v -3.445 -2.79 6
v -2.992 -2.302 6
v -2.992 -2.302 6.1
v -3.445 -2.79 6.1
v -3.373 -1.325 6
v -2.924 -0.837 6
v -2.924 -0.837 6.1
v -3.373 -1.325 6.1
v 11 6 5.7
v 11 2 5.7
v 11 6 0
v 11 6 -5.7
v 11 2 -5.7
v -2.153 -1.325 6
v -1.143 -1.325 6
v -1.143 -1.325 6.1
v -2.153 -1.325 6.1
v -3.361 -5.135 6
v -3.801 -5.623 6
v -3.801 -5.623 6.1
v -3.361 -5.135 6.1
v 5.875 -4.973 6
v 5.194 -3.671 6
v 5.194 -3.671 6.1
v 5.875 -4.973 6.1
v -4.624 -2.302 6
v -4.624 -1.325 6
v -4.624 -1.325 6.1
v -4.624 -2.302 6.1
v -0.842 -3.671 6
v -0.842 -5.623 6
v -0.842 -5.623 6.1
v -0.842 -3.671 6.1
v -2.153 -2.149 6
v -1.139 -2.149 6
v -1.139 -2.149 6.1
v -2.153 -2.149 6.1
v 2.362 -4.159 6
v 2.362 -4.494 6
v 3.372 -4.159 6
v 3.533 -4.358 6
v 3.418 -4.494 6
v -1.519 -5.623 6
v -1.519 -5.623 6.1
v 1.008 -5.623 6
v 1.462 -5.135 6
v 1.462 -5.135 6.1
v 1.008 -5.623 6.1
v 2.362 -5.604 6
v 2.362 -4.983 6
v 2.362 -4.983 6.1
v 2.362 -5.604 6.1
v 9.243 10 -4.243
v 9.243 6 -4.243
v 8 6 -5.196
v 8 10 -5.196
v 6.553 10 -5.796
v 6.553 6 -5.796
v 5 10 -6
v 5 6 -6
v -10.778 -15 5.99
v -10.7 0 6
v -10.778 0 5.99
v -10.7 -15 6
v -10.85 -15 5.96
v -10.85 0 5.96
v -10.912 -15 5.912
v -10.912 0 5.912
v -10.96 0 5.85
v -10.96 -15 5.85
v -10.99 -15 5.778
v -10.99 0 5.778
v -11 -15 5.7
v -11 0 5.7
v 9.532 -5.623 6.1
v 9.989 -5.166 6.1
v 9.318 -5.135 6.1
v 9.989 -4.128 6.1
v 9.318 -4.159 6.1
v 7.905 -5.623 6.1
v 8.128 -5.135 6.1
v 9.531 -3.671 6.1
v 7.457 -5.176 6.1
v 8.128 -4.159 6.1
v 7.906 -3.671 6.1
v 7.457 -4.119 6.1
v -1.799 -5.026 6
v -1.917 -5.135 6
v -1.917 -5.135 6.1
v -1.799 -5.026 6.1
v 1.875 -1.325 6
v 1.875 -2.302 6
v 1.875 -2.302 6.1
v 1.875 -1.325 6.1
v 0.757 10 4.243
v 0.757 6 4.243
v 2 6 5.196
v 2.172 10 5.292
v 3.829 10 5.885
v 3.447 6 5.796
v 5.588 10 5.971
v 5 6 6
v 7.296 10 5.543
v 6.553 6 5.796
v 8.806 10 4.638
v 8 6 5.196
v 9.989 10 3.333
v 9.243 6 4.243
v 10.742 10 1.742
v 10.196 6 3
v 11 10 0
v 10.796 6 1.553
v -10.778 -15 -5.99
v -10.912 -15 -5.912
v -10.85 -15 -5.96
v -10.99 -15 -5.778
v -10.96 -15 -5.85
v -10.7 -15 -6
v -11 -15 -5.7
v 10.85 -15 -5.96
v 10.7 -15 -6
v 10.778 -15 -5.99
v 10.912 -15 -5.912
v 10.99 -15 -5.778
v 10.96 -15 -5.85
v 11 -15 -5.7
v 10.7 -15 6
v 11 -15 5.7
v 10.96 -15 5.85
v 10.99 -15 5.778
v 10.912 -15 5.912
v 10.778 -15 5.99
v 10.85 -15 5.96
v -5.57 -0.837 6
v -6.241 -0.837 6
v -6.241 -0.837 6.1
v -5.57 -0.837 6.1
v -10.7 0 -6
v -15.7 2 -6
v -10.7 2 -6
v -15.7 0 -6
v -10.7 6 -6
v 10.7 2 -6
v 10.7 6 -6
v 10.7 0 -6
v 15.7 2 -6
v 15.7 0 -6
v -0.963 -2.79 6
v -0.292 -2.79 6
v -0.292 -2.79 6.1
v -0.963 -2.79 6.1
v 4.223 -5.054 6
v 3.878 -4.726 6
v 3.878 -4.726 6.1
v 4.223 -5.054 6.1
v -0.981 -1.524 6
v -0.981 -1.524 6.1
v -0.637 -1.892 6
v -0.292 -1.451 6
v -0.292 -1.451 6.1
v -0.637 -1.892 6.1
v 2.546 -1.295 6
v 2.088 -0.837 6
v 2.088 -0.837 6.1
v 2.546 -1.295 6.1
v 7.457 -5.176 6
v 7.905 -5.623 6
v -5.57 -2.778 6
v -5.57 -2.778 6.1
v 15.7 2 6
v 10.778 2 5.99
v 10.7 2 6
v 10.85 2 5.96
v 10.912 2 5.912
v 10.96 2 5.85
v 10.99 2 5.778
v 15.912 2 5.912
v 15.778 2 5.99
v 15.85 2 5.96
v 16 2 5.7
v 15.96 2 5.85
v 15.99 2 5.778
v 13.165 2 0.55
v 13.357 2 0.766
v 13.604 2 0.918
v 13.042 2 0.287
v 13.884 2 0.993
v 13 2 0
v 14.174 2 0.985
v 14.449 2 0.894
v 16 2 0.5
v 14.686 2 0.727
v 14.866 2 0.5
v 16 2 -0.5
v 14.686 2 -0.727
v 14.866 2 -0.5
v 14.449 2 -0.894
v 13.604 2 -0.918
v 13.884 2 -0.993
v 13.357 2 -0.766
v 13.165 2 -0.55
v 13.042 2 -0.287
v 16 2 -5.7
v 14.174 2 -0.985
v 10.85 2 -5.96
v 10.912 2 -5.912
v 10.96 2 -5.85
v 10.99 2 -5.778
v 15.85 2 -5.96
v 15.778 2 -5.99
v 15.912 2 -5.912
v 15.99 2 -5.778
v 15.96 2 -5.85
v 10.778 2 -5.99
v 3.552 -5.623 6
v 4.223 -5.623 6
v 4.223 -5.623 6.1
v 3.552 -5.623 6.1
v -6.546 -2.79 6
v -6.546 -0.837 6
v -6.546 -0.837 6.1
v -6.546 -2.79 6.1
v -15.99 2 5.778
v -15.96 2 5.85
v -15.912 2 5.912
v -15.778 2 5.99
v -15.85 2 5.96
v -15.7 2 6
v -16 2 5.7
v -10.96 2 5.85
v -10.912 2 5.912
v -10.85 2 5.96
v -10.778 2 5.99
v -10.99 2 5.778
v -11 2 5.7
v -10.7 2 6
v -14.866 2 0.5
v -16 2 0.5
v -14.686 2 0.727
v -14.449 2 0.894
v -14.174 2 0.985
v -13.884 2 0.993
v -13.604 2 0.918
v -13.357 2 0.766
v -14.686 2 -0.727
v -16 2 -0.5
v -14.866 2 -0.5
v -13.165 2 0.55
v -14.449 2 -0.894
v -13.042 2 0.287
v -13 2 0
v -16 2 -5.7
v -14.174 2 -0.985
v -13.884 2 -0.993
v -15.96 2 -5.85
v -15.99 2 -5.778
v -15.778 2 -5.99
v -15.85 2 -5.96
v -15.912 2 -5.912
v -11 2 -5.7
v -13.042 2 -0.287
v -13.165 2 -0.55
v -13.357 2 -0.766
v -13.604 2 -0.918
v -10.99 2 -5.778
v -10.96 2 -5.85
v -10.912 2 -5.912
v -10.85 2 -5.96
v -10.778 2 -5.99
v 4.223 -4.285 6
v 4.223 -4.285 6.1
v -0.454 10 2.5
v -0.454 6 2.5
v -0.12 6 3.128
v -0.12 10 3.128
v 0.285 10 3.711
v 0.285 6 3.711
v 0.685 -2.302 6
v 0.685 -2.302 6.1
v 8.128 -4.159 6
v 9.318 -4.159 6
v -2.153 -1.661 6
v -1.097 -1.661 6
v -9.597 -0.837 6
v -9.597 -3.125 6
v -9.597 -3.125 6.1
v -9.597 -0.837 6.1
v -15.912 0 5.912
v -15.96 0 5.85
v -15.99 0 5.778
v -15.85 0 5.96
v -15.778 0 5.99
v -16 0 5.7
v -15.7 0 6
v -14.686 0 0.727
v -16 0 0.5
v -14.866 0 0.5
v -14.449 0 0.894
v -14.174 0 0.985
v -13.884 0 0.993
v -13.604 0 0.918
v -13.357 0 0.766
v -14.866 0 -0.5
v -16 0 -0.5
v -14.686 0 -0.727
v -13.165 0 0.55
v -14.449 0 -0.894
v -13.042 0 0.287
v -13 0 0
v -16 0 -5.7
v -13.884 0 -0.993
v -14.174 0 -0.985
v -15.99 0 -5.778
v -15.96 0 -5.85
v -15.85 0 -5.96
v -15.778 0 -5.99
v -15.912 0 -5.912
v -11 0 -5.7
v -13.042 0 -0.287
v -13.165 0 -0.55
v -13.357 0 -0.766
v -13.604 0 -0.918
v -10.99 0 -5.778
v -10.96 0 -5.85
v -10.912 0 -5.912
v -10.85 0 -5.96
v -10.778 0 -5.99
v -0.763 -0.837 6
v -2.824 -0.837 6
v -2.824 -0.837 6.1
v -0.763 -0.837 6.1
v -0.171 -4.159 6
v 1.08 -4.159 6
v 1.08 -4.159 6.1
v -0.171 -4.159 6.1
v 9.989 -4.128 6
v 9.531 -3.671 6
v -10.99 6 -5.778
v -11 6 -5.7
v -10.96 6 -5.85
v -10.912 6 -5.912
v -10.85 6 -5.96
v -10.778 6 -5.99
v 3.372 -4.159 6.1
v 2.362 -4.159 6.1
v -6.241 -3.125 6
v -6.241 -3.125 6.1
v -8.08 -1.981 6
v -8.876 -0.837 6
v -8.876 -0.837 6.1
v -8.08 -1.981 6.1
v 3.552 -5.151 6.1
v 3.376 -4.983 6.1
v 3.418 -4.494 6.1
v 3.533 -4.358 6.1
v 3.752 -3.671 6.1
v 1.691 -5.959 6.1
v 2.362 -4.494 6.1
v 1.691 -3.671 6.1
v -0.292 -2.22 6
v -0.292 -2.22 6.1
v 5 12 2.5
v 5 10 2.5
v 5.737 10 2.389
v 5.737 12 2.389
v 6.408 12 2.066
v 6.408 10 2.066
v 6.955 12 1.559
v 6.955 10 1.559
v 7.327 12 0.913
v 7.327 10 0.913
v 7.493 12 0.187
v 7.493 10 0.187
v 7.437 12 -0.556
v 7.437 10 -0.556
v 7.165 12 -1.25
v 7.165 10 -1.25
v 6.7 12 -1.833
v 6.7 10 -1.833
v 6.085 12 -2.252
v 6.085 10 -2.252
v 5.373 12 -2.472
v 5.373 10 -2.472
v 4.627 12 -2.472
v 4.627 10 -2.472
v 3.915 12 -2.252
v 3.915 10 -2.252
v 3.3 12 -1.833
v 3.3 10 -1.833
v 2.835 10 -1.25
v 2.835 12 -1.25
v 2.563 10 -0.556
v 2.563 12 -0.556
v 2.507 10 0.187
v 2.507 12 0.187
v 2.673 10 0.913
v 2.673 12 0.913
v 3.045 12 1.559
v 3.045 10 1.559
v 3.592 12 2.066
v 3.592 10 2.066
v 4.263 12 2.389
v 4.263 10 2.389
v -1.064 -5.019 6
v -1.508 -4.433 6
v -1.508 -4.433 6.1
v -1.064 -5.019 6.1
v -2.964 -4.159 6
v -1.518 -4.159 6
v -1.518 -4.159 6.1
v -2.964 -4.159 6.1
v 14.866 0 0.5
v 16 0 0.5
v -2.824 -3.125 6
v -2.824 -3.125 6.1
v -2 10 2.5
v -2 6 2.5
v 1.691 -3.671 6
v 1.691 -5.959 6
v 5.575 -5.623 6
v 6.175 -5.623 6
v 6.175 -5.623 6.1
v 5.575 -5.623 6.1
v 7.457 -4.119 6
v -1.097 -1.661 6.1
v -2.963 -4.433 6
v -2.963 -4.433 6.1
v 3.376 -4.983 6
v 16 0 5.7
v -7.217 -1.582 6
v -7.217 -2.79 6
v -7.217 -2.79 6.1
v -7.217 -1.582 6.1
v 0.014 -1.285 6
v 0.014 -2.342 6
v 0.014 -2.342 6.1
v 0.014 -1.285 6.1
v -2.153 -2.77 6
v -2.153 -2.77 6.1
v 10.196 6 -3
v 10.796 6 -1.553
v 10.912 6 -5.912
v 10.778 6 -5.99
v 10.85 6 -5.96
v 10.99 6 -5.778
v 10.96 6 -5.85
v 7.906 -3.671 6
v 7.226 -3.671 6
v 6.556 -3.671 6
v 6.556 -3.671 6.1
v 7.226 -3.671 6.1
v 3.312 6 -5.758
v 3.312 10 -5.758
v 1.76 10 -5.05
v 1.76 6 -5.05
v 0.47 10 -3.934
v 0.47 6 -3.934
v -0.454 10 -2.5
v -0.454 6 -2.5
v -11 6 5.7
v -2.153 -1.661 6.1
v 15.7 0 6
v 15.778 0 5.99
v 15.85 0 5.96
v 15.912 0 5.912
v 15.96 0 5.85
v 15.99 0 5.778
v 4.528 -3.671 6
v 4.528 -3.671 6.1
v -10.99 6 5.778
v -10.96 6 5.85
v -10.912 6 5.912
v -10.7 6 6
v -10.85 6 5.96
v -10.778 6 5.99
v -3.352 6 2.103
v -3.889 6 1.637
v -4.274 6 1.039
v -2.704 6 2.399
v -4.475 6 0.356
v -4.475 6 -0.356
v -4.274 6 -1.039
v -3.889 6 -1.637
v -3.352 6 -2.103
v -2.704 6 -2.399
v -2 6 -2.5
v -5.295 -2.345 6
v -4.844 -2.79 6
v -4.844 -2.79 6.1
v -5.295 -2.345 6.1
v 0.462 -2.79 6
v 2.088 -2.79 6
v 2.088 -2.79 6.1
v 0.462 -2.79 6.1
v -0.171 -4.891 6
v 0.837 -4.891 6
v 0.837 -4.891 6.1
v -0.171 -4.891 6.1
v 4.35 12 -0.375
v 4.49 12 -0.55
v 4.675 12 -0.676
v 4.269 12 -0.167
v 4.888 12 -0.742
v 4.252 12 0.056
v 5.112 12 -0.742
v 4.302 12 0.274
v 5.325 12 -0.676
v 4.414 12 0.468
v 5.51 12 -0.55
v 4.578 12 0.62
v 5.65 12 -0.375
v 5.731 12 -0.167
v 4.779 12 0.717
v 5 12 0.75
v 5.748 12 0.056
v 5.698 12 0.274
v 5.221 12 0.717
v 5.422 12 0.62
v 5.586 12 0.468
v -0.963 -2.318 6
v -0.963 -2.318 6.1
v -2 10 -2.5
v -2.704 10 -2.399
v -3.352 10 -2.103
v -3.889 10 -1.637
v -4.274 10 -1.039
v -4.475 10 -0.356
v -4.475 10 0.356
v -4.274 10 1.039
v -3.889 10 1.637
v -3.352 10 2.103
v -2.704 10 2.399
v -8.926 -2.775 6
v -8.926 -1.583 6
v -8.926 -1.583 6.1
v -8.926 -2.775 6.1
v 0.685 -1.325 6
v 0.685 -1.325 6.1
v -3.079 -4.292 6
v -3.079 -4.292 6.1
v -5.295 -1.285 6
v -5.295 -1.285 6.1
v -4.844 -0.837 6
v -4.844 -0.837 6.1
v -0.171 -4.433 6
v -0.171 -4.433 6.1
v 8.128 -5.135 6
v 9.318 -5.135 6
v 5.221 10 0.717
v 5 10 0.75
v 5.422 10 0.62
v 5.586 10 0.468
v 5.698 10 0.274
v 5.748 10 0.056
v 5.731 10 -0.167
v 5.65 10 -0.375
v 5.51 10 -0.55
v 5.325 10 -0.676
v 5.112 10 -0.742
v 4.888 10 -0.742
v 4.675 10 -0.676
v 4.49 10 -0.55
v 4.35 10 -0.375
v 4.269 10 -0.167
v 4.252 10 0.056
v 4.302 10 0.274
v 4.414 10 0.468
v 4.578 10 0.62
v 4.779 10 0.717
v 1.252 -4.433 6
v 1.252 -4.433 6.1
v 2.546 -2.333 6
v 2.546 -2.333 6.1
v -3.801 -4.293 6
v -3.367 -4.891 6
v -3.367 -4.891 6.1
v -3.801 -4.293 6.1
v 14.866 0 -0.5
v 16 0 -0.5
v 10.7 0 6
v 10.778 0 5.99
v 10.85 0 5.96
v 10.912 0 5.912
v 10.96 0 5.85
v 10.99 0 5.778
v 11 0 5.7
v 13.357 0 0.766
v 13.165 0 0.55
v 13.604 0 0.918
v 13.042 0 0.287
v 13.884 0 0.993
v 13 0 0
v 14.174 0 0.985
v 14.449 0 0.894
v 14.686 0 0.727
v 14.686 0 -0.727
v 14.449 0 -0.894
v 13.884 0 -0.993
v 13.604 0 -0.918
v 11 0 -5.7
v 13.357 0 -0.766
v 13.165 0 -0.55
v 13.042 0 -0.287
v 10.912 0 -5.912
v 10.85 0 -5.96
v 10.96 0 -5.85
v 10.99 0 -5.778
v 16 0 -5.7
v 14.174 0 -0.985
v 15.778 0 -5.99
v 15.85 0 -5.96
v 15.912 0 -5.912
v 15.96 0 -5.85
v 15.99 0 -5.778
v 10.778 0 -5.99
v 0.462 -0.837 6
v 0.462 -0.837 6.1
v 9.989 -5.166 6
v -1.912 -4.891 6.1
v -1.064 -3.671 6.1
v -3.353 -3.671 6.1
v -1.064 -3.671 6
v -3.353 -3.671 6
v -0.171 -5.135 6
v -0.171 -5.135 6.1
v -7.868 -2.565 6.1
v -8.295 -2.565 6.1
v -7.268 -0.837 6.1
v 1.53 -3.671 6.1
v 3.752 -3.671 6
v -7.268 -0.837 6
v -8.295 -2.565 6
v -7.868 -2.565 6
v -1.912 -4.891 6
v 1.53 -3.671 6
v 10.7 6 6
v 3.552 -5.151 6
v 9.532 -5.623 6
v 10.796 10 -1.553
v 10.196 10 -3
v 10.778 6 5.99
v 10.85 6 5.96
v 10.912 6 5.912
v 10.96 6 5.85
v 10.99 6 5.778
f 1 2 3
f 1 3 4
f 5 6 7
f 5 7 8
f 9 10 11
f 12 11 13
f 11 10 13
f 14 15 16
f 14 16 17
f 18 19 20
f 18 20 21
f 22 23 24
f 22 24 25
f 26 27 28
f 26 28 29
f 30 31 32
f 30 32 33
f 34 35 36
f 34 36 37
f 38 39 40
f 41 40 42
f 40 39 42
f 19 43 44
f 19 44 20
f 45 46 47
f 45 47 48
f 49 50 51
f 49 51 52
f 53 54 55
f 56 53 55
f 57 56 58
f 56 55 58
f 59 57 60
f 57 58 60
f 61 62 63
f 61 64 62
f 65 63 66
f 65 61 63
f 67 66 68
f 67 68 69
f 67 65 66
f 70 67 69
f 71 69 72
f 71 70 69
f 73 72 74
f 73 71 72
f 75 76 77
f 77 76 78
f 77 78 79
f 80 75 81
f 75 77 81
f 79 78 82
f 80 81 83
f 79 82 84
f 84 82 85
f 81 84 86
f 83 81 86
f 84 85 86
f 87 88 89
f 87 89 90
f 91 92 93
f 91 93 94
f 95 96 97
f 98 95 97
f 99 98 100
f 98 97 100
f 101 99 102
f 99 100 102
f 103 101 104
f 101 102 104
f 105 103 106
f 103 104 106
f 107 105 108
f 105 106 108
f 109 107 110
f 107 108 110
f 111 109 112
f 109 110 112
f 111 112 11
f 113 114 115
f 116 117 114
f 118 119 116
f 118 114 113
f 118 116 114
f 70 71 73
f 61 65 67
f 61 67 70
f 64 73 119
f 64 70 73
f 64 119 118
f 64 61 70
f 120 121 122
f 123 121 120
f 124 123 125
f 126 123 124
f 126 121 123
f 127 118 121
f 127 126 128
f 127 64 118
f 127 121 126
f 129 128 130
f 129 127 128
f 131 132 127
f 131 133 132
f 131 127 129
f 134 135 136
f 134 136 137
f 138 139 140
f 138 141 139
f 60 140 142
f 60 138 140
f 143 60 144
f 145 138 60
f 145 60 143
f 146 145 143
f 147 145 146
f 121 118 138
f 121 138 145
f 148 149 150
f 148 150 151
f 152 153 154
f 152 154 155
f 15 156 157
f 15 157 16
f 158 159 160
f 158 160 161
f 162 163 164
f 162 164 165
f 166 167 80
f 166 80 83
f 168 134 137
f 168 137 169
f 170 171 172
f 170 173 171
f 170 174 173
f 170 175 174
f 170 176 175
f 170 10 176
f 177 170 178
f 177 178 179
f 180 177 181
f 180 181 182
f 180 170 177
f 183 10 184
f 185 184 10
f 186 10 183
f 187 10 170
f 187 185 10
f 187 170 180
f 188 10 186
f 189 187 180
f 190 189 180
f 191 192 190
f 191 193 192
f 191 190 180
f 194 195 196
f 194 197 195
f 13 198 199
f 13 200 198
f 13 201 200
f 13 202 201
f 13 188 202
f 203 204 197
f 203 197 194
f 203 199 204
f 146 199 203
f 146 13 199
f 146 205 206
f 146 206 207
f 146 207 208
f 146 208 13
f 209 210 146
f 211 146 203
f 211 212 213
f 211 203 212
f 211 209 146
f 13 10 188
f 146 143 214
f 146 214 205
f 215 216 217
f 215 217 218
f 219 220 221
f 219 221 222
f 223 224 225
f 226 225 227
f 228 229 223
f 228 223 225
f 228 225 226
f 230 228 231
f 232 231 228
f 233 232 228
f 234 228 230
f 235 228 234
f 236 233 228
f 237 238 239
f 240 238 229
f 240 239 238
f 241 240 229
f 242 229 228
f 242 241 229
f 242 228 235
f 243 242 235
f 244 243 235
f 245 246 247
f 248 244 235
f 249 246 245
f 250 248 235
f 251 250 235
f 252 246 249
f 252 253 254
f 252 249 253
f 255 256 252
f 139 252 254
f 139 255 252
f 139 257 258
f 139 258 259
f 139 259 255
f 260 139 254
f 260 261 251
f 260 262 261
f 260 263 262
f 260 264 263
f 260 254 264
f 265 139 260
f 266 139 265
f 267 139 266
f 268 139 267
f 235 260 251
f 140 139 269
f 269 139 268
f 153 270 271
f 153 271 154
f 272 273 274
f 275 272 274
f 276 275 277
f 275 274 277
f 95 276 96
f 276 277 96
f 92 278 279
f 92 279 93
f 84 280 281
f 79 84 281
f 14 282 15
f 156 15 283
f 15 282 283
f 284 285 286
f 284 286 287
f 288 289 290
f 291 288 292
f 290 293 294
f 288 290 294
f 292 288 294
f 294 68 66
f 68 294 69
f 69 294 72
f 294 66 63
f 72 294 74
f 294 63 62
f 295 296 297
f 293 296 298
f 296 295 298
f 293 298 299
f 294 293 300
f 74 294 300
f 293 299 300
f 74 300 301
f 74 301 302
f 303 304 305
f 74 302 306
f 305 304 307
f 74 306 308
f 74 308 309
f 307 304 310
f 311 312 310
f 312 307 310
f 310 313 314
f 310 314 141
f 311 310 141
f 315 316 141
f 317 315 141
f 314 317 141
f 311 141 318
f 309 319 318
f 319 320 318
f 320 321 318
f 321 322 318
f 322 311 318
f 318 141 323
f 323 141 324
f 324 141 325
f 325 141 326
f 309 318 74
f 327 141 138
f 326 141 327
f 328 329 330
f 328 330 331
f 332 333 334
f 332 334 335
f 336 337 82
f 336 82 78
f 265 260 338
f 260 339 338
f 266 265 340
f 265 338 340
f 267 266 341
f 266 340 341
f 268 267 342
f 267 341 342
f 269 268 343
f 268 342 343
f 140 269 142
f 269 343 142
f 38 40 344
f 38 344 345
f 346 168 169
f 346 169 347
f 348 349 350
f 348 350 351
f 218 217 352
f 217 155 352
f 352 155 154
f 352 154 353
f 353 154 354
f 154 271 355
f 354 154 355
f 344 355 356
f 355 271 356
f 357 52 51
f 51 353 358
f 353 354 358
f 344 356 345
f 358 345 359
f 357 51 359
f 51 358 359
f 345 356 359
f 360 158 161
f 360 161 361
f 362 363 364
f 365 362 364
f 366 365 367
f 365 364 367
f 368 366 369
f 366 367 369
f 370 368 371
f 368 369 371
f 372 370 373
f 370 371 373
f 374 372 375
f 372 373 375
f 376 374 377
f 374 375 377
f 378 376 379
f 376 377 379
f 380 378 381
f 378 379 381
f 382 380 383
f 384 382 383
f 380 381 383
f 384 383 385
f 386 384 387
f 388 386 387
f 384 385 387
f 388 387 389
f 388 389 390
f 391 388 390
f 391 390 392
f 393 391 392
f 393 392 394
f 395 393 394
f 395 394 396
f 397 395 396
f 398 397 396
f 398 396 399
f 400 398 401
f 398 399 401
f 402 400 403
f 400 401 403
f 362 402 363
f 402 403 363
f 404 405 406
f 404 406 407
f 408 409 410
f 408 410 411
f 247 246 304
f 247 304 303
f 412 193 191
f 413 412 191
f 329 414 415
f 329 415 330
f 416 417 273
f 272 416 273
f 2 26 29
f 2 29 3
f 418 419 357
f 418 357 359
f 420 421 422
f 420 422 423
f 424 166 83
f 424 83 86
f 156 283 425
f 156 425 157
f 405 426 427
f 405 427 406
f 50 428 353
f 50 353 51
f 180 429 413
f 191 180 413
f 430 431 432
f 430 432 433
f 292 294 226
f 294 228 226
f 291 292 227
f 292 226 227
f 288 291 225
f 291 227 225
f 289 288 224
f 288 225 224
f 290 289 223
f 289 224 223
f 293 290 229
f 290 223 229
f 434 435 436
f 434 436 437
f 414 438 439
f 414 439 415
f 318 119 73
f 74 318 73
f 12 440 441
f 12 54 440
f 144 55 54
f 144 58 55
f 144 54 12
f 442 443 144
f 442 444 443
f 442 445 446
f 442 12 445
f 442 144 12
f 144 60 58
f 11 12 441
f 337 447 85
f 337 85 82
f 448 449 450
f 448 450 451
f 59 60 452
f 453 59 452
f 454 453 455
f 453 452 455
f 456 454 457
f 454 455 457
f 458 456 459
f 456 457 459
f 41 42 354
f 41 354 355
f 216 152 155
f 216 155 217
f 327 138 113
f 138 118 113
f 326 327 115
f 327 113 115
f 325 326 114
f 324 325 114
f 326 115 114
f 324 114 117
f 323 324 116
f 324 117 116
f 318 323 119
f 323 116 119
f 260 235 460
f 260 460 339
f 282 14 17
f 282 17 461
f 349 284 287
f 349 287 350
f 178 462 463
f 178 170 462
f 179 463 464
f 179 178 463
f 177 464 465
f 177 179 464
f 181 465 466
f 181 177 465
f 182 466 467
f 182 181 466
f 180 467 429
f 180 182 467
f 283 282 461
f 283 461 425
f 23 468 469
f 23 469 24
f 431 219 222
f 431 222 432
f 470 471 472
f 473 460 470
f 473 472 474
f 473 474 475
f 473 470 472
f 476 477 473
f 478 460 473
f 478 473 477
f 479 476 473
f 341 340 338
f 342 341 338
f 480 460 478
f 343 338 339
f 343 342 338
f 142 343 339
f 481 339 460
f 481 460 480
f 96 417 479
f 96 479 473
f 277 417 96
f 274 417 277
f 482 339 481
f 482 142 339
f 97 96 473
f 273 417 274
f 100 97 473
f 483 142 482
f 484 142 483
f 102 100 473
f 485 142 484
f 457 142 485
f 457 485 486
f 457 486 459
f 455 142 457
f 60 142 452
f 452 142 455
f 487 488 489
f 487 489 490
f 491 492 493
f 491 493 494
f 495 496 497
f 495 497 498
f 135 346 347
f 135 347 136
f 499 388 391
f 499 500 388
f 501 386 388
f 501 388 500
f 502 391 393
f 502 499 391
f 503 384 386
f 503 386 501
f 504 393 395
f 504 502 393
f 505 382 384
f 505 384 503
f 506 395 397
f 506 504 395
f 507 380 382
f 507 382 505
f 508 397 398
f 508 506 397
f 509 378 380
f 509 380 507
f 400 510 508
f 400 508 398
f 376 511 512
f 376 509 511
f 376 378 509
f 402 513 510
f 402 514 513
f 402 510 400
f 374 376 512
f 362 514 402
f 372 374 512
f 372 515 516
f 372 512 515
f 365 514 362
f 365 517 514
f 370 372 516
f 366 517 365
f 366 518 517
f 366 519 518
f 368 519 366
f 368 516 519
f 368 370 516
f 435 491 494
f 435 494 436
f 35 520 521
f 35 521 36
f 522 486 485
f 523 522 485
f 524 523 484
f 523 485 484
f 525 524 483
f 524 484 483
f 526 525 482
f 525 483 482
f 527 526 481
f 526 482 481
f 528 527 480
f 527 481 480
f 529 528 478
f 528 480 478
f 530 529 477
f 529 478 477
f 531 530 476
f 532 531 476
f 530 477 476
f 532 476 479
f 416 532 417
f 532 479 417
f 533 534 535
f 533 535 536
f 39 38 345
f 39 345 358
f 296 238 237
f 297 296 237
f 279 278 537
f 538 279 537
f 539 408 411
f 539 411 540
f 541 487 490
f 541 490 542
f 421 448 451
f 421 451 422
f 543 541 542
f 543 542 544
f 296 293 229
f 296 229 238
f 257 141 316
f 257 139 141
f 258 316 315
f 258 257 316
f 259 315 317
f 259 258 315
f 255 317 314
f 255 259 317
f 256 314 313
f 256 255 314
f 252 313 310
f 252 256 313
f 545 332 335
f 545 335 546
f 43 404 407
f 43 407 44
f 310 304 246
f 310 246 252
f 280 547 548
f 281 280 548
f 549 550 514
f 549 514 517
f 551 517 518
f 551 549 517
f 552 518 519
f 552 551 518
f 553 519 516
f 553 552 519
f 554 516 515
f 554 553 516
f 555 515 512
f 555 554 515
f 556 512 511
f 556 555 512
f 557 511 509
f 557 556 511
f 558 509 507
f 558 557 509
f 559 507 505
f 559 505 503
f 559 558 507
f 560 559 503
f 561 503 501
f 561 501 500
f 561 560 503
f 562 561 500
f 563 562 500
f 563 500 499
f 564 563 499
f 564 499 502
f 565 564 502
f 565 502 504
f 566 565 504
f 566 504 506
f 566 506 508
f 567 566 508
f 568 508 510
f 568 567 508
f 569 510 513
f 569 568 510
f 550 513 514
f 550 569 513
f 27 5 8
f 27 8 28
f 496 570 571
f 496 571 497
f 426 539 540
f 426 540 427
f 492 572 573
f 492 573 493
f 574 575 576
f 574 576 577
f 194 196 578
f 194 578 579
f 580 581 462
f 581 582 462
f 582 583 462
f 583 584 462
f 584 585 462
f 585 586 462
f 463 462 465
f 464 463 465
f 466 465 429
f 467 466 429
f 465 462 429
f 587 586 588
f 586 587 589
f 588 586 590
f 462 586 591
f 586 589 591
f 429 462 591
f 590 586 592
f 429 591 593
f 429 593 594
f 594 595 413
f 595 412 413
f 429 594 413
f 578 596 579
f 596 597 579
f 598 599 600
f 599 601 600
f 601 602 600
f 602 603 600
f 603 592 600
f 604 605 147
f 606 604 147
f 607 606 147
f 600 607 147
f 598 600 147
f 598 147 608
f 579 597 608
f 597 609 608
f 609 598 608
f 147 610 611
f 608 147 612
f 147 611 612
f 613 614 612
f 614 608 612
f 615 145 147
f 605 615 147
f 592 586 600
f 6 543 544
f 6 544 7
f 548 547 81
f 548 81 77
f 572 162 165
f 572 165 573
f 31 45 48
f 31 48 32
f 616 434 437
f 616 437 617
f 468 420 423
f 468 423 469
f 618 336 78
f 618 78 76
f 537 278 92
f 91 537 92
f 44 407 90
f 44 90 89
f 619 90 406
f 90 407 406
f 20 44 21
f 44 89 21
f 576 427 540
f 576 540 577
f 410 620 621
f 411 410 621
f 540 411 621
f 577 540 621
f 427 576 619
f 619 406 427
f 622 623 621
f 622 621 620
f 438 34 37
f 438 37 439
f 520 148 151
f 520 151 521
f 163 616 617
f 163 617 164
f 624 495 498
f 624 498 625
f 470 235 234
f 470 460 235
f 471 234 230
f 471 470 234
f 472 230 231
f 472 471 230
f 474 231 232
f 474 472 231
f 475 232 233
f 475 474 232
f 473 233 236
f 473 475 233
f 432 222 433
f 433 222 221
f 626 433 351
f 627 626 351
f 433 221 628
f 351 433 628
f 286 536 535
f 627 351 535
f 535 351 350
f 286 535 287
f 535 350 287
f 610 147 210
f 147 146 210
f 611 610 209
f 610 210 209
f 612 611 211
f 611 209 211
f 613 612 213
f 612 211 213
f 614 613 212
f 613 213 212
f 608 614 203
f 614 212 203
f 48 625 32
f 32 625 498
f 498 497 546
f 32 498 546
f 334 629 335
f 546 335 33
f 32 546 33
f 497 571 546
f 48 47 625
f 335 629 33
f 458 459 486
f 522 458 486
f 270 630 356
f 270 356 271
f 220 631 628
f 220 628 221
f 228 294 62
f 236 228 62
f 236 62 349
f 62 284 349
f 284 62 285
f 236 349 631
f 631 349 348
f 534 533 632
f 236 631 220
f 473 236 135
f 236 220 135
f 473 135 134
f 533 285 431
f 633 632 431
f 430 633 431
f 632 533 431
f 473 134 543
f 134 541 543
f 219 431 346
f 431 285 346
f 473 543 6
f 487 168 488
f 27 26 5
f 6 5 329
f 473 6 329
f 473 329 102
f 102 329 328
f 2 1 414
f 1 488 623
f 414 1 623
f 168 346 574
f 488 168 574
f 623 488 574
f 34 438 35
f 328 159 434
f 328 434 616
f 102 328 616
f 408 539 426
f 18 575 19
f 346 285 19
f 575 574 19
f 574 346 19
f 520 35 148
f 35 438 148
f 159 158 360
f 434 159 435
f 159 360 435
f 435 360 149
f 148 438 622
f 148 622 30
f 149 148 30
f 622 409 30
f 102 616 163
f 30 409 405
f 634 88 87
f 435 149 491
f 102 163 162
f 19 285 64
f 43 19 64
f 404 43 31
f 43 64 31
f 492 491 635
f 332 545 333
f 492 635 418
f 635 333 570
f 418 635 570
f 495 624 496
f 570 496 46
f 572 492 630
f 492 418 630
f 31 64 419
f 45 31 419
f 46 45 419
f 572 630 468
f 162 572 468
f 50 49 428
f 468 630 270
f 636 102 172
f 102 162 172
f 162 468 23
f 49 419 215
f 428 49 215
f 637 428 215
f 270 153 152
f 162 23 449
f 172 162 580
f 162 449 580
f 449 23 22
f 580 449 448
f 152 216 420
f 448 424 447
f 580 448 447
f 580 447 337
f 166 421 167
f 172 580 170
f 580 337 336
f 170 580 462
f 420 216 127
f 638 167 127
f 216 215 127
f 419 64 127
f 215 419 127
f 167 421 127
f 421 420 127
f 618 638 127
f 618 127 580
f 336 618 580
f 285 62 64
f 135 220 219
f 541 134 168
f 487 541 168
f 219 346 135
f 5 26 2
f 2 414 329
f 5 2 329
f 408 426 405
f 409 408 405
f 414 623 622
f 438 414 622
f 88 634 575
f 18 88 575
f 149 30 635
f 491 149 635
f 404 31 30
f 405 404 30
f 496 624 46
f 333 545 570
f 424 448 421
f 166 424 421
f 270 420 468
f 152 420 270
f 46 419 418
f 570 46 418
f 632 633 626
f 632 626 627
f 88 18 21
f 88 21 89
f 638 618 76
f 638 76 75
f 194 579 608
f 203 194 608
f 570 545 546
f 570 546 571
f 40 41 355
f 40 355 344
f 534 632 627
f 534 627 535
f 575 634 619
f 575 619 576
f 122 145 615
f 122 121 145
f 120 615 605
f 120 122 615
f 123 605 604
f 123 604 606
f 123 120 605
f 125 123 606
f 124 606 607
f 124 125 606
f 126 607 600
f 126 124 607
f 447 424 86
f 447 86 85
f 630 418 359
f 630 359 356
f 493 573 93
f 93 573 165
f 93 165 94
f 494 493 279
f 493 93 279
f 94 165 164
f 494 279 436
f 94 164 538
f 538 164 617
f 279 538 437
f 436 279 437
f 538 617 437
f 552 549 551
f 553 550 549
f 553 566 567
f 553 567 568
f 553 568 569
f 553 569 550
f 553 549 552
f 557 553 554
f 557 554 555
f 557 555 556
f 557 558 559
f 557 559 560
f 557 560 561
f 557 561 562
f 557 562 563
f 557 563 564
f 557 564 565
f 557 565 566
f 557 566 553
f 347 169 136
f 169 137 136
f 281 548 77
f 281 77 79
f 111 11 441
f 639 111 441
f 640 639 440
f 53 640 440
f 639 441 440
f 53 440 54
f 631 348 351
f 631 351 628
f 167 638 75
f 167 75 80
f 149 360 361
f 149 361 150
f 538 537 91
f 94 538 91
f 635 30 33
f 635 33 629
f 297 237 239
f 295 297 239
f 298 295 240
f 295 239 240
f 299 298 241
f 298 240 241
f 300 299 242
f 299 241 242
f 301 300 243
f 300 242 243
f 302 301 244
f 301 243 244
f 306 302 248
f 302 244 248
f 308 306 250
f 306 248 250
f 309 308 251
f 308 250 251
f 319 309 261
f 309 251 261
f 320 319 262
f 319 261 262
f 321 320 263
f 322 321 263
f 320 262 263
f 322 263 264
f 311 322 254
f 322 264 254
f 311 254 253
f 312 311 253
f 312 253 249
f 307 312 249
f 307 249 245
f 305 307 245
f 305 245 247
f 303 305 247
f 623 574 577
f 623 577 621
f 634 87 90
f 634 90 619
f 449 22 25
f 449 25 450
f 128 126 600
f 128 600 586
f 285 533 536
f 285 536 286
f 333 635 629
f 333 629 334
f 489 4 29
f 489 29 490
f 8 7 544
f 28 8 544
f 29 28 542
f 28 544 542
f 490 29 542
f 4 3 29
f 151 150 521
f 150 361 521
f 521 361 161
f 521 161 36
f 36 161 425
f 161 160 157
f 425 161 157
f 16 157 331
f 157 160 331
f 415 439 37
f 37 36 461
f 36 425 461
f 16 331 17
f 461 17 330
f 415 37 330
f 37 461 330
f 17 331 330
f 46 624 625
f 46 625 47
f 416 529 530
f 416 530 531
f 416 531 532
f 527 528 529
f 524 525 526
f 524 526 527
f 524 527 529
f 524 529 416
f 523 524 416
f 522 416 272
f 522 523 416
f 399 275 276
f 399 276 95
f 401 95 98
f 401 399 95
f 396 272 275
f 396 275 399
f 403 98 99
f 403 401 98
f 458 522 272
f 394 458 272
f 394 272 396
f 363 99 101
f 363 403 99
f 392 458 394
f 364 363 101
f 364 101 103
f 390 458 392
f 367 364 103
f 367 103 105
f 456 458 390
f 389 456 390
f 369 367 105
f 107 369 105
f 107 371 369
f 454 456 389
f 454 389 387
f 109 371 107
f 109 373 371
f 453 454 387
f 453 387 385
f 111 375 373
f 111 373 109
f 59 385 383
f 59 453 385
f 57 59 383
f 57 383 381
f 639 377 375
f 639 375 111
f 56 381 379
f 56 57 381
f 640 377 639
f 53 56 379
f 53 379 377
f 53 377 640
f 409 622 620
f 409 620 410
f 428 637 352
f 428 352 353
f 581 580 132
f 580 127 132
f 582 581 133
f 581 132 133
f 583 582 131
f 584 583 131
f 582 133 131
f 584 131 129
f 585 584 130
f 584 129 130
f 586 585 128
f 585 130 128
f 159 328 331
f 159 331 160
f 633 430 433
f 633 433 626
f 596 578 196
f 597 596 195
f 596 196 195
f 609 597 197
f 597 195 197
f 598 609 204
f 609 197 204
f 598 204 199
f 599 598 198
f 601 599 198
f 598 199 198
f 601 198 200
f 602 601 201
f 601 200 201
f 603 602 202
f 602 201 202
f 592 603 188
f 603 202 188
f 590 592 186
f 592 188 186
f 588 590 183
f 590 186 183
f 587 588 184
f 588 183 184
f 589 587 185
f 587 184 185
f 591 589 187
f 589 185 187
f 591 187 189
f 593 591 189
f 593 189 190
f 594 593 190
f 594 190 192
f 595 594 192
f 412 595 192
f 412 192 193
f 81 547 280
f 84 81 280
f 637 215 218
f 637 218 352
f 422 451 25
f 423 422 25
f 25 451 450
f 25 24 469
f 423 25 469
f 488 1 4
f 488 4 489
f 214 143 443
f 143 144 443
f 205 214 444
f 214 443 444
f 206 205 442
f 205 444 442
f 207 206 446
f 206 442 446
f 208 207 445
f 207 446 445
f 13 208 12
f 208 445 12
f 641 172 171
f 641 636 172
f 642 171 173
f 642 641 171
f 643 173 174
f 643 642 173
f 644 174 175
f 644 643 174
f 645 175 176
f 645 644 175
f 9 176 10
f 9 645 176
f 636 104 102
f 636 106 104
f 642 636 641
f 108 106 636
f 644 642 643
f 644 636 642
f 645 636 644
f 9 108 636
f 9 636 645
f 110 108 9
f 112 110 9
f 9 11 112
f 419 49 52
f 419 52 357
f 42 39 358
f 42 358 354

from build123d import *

# Parameters (mm, degrees)
SKETCH1_W           = 32
SKETCH1_H           = 12
BOSS_EXTRUDE1_DEPTH = 2
SKETCH2_W           = 22
SKETCH2_H           = 12
BOSS_EXTRUDE2_DEPTH = 15
SKETCH3_W           = 22
SKETCH3_H           = 12
BOSS_EXTRUDE3_DEPTH = 4
BOSS_EXTRUDE4_DEPTH = 4
BOSS_EXTRUDE5_DEPTH = 4
SKETCH6_R           = 2.5
SKETCH6_R_2         = 0.75
BOSS_EXTRUDE6_DEPTH = 2
SKETCH7_R           = 1
SKETCH7_W           = 5
SKETCH7_H           = 1
CUT_EXTRUDE1_DEPTH  = 25.103941586
FILLET1_R           = 0.3
SKETCH8_W           = 1.18990991
SKETCH8_H           = 0.976336336
SKETCH8_H_2         = 0.976336337
BOSS_EXTRUDE7_DEPTH = 0.1


with BuildPart() as part:
    # Sketch1 → Boss-Extrude1 (new body)
    with BuildSketch(Plane(origin=(0, 0, 0), x_dir=(1, 0, 0), z_dir=(0, 1, 0))):
        Rectangle(SKETCH1_W, SKETCH1_H)
    extrude(amount=BOSS_EXTRUDE1_DEPTH)

    # Sketch2 → Boss-Extrude2 (add)
    with BuildSketch(Plane.XZ):
        Rectangle(SKETCH2_W, SKETCH2_H)
    extrude(amount=BOSS_EXTRUDE2_DEPTH)

    # Sketch3 → Boss-Extrude3 (add)
    with BuildSketch(Plane(origin=(0, 2, 0), x_dir=(1, 0, 0), z_dir=(0, 1, 0))):
        Rectangle(SKETCH3_W, SKETCH3_H)
    extrude(amount=BOSS_EXTRUDE3_DEPTH)

    # Sketch4 → Boss-Extrude4 (add)
    with BuildSketch(Plane(origin=(0, 6, 0), x_dir=(1, 0, 0), z_dir=(0, 1, 0))):
        with BuildLine():
            ThreePointArc((9.242640687, 4.242640687), (7.296100594, 5.543277195), (5, 6))
            ThreePointArc((5, 6), (0.757359313, 4.242640687), (-1, 0))
            ThreePointArc((-1, 0), (-0.543277195, -2.296100594), (0.757359313, -4.242640687))
            Line((0.757359313, -4.242640687), (9.242640687, 4.242640687))
        make_face()
        with BuildLine():
            ThreePointArc((11, 0), (10.543277195, 2.296100594), (9.242640687, 4.242640687))
            Line((9.242640687, 4.242640687), (0.757359313, -4.242640687))
            ThreePointArc((0.757359313, -4.242640687), (7.296100594, -5.543277195), (11, 0))
        make_face()
    extrude(amount=BOSS_EXTRUDE4_DEPTH)

    # Sketch5 → Boss-Extrude5 (add)
    with BuildSketch(Plane(origin=(0, 6, 0), x_dir=(1, 0, 0), z_dir=(0, 1, 0))):
        with BuildLine():
            ThreePointArc((-1, 0), (-0.862002062, 1.279426367), (-0.454356057, 2.5))
            Line((-0.454356057, 2.5), (-2, 2.5))
            ThreePointArc((-2, 2.5), (-4.5, 0), (-2, -2.5))
            Line((-2, -2.5), (-0.454356057, -2.5))
            ThreePointArc((-0.454356057, -2.5), (-0.862002062, -1.279426367), (-1, 0))
        make_face()
    extrude(amount=BOSS_EXTRUDE5_DEPTH)

    # Sketch6 → Boss-Extrude6 (add)
    with BuildSketch(Plane(origin=(0, 10, 0), x_dir=(1, 0, 0), z_dir=(0, 1, 0))):
        with Locations(Location((5, 0, 0), (0, 0, 270))):
            Circle(SKETCH6_R)
        with Locations(Location((5, 0, 0), (0, 0, 270))):
            Circle(SKETCH6_R_2, mode=Mode.SUBTRACT)
    extrude(amount=BOSS_EXTRUDE6_DEPTH)

    # Sketch7 → Cut-Extrude1 (cut, through all)
    with BuildSketch(Plane(origin=(0, 2, 0), x_dir=(1, 0, 0), z_dir=(0, 1, 0))):
        with Locations((14, 0)):
            Circle(SKETCH7_R)
        with Locations((-14, 0)):
            Circle(SKETCH7_R)
        with Locations((16, 0)):
            Rectangle(SKETCH7_W, SKETCH7_H)
        with Locations((-16, 0)):
            Rectangle(SKETCH7_W, SKETCH7_H)
    extrude(amount=-CUT_EXTRUDE1_DEPTH, mode=Mode.SUBTRACT)

    # Fillet1
    fillet1_edges = [part.edges().sort_by_distance(p)[0] for p in [
        (11, 4, -6),
        (11, -7.5, -6),
        (11, 4, 6),
        (11, -7.5, 6),
        (-11, 4, -6),
        (-11, 4, 6),
        (-11, -7.5, 6),
        (-11, -7.5, -6),
        (-16, 1, -6),
        (-16, 1, 6),
        (16, 1, -6),
        (16, 1, 6),
    ]]
    fillet(fillet1_edges, radius=FILLET1_R)

    # Sketch8 → Boss-Extrude7 (add)
    # profile 1 of 10: a face of its own
    with BuildSketch(Plane.XY.offset(6)):
        Polygon((-6.546228955, -2.789688189), (-7.217460186, -2.789688189), (-7.217460186, -1.581662663), (-7.868192168, -2.564673174), (-8.295339315, -2.564673174), (-8.926048774, -1.582616117), (-8.926048774, -2.775386387), (-9.597280006, -3.125303805), (-9.597280006, -0.837015516), (-8.876469195, -0.837015516), (-8.079858834, -1.98115966), (-7.268469946, -0.837015516), (-6.546228955, -0.837015516), align=None)
    # profile 2 of 10: a face of its own
    with BuildSketch(Plane.XY.offset(6)):
        Polygon((-5.569892618, -2.778246748), (-6.241123849, -3.125303805), (-6.241123849, -0.837015516), (-5.569892618, -0.837015516), align=None)
    # profile 3 of 10: a face of its own
    with BuildSketch(Plane.XY.offset(6)):
        Polygon((-2.923582558, -0.837015516), (-3.373135861, -1.325183685), (-4.624066792, -1.325183685), (-4.624066792, -2.301520021), (-2.99175448, -2.301520021), (-3.445121597, -2.789688189), (-4.84431454, -2.789688189), (-5.295298024, -2.344902153), (-5.295298024, -1.285138639), (-4.84431454, -0.837015516), align=None)
    # profile 4 of 10: a face of its own
    with BuildSketch(Plane.XY.offset(6)):
        Polygon((-0.2915743, -2.789688189), (-0.962805531, -2.789688189), (-0.962805531, -2.31772873), (-1.138717693, -2.148967468), (-2.152715441, -2.148967468), (-2.152715441, -2.770142393), (-2.823946672, -3.125303805), (-2.823946672, -0.837015516), (-0.762580306, -0.837015516), (-0.2915743, -1.45103954), (-0.63672445, -1.892488489), (-0.2915743, -2.219999751), align=None)
        Polygon((-0.981397873, -1.52397873), (-1.143008234, -1.325183685), (-2.152715441, -1.325183685), (-2.152715441, -1.6607993), (-1.096765741, -1.6607993), align=None, mode=Mode.SUBTRACT)
    # profile 5 of 10: a face of its own
    with BuildSketch(Plane.XY.offset(6)):
        Polygon((2.545903178, -2.332507258), (2.08824552, -2.789688189), (0.461653928, -2.789688189), (0.013530805, -2.342041793), (0.013530805, -1.285138639), (0.462130655, -0.837015516), (2.087768793, -0.837015516), (2.545903178, -1.294673174), align=None)
        with Locations((1.279716991, -1.813351853)):
            Rectangle(SKETCH8_W, SKETCH8_H, mode=Mode.SUBTRACT)
    # profile 6 of 10: a face of its own
    with BuildSketch(Plane.XY.offset(6)):
        Polygon((-1.064397577, -5.019272635), (-1.519194874, -5.623285398), (-3.801285715, -5.623285398), (-3.361266946, -5.13511723), (-1.916784964, -5.13511723), (-1.799033463, -5.025946809), (-1.91154097, -4.891033146), (-3.366987667, -4.891033146), (-3.801285715, -4.292741103), (-3.352685865, -3.670612725), (-1.064397577, -3.670612725), (-1.517764694, -4.158780893), (-2.964153583, -4.158780893), (-3.079044724, -4.29178765), (-2.963200129, -4.433375488), (-1.507753433, -4.433375488), align=None)
    # profile 7 of 10: a face of its own
    with BuildSketch(Plane.XY.offset(6)):
        Polygon((1.52994927, -3.670612725), (1.080395967, -4.158780893), (-0.170534964, -4.158780893), (-0.170534964, -4.433375488), (1.251540862, -4.433375488), (0.837265336, -4.891033146), (-0.170534964, -4.891033146), (-0.170534964, -5.13511723), (1.461777348, -5.13511723), (1.008410231, -5.623285398), (-0.841766195, -5.623285398), (-0.841766195, -3.670612725), align=None)
    # profile 8 of 10: a face of its own
    with BuildSketch(Plane.XY.offset(6)):
        Polygon((4.222978549, -5.623285398), (3.551747318, -5.623285398), (3.551747318, -5.151325938), (3.375835156, -4.982564677), (2.361837408, -4.982564677), (2.361837408, -5.603739602), (1.690606177, -5.958901013), (1.690606177, -3.670612725), (3.751972543, -3.670612725), (4.222978549, -4.284636749), (3.877828399, -4.726085698), (4.222978549, -5.053596959), align=None)
        Polygon((3.533154976, -4.357575938), (3.371544615, -4.158780893), (2.361837408, -4.158780893), (2.361837408, -4.494396509), (3.417787108, -4.494396509), align=None, mode=Mode.SUBTRACT)
    # profile 9 of 10: a face of its own
    with BuildSketch(Plane.XY.offset(6)):
        Polygon((7.226356928, -3.670612725), (6.175174495, -5.623285398), (5.574975546, -5.623285398), (4.528083654, -3.670612725), (5.194070892, -3.670612725), (5.874836657, -4.972553416), (6.555602423, -3.670612725), align=None)
    # profile 10 of 10: a face of its own
    with BuildSketch(Plane.XY.offset(6)):
        Polygon((9.989465036, -5.166104467), (9.531807378, -5.623285398), (7.905215787, -5.623285398), (7.457092663, -5.175639001), (7.457092663, -4.118735848), (7.905692513, -3.670612725), (9.531330651, -3.670612725), (9.989465036, -4.128270383), align=None)
        with Locations((8.72327885, -4.646949062)):
            Rectangle(SKETCH8_W, SKETCH8_H_2, mode=Mode.SUBTRACT)
    extrude(amount=BOSS_EXTRUDE7_DEPTH)


solid = part.part
